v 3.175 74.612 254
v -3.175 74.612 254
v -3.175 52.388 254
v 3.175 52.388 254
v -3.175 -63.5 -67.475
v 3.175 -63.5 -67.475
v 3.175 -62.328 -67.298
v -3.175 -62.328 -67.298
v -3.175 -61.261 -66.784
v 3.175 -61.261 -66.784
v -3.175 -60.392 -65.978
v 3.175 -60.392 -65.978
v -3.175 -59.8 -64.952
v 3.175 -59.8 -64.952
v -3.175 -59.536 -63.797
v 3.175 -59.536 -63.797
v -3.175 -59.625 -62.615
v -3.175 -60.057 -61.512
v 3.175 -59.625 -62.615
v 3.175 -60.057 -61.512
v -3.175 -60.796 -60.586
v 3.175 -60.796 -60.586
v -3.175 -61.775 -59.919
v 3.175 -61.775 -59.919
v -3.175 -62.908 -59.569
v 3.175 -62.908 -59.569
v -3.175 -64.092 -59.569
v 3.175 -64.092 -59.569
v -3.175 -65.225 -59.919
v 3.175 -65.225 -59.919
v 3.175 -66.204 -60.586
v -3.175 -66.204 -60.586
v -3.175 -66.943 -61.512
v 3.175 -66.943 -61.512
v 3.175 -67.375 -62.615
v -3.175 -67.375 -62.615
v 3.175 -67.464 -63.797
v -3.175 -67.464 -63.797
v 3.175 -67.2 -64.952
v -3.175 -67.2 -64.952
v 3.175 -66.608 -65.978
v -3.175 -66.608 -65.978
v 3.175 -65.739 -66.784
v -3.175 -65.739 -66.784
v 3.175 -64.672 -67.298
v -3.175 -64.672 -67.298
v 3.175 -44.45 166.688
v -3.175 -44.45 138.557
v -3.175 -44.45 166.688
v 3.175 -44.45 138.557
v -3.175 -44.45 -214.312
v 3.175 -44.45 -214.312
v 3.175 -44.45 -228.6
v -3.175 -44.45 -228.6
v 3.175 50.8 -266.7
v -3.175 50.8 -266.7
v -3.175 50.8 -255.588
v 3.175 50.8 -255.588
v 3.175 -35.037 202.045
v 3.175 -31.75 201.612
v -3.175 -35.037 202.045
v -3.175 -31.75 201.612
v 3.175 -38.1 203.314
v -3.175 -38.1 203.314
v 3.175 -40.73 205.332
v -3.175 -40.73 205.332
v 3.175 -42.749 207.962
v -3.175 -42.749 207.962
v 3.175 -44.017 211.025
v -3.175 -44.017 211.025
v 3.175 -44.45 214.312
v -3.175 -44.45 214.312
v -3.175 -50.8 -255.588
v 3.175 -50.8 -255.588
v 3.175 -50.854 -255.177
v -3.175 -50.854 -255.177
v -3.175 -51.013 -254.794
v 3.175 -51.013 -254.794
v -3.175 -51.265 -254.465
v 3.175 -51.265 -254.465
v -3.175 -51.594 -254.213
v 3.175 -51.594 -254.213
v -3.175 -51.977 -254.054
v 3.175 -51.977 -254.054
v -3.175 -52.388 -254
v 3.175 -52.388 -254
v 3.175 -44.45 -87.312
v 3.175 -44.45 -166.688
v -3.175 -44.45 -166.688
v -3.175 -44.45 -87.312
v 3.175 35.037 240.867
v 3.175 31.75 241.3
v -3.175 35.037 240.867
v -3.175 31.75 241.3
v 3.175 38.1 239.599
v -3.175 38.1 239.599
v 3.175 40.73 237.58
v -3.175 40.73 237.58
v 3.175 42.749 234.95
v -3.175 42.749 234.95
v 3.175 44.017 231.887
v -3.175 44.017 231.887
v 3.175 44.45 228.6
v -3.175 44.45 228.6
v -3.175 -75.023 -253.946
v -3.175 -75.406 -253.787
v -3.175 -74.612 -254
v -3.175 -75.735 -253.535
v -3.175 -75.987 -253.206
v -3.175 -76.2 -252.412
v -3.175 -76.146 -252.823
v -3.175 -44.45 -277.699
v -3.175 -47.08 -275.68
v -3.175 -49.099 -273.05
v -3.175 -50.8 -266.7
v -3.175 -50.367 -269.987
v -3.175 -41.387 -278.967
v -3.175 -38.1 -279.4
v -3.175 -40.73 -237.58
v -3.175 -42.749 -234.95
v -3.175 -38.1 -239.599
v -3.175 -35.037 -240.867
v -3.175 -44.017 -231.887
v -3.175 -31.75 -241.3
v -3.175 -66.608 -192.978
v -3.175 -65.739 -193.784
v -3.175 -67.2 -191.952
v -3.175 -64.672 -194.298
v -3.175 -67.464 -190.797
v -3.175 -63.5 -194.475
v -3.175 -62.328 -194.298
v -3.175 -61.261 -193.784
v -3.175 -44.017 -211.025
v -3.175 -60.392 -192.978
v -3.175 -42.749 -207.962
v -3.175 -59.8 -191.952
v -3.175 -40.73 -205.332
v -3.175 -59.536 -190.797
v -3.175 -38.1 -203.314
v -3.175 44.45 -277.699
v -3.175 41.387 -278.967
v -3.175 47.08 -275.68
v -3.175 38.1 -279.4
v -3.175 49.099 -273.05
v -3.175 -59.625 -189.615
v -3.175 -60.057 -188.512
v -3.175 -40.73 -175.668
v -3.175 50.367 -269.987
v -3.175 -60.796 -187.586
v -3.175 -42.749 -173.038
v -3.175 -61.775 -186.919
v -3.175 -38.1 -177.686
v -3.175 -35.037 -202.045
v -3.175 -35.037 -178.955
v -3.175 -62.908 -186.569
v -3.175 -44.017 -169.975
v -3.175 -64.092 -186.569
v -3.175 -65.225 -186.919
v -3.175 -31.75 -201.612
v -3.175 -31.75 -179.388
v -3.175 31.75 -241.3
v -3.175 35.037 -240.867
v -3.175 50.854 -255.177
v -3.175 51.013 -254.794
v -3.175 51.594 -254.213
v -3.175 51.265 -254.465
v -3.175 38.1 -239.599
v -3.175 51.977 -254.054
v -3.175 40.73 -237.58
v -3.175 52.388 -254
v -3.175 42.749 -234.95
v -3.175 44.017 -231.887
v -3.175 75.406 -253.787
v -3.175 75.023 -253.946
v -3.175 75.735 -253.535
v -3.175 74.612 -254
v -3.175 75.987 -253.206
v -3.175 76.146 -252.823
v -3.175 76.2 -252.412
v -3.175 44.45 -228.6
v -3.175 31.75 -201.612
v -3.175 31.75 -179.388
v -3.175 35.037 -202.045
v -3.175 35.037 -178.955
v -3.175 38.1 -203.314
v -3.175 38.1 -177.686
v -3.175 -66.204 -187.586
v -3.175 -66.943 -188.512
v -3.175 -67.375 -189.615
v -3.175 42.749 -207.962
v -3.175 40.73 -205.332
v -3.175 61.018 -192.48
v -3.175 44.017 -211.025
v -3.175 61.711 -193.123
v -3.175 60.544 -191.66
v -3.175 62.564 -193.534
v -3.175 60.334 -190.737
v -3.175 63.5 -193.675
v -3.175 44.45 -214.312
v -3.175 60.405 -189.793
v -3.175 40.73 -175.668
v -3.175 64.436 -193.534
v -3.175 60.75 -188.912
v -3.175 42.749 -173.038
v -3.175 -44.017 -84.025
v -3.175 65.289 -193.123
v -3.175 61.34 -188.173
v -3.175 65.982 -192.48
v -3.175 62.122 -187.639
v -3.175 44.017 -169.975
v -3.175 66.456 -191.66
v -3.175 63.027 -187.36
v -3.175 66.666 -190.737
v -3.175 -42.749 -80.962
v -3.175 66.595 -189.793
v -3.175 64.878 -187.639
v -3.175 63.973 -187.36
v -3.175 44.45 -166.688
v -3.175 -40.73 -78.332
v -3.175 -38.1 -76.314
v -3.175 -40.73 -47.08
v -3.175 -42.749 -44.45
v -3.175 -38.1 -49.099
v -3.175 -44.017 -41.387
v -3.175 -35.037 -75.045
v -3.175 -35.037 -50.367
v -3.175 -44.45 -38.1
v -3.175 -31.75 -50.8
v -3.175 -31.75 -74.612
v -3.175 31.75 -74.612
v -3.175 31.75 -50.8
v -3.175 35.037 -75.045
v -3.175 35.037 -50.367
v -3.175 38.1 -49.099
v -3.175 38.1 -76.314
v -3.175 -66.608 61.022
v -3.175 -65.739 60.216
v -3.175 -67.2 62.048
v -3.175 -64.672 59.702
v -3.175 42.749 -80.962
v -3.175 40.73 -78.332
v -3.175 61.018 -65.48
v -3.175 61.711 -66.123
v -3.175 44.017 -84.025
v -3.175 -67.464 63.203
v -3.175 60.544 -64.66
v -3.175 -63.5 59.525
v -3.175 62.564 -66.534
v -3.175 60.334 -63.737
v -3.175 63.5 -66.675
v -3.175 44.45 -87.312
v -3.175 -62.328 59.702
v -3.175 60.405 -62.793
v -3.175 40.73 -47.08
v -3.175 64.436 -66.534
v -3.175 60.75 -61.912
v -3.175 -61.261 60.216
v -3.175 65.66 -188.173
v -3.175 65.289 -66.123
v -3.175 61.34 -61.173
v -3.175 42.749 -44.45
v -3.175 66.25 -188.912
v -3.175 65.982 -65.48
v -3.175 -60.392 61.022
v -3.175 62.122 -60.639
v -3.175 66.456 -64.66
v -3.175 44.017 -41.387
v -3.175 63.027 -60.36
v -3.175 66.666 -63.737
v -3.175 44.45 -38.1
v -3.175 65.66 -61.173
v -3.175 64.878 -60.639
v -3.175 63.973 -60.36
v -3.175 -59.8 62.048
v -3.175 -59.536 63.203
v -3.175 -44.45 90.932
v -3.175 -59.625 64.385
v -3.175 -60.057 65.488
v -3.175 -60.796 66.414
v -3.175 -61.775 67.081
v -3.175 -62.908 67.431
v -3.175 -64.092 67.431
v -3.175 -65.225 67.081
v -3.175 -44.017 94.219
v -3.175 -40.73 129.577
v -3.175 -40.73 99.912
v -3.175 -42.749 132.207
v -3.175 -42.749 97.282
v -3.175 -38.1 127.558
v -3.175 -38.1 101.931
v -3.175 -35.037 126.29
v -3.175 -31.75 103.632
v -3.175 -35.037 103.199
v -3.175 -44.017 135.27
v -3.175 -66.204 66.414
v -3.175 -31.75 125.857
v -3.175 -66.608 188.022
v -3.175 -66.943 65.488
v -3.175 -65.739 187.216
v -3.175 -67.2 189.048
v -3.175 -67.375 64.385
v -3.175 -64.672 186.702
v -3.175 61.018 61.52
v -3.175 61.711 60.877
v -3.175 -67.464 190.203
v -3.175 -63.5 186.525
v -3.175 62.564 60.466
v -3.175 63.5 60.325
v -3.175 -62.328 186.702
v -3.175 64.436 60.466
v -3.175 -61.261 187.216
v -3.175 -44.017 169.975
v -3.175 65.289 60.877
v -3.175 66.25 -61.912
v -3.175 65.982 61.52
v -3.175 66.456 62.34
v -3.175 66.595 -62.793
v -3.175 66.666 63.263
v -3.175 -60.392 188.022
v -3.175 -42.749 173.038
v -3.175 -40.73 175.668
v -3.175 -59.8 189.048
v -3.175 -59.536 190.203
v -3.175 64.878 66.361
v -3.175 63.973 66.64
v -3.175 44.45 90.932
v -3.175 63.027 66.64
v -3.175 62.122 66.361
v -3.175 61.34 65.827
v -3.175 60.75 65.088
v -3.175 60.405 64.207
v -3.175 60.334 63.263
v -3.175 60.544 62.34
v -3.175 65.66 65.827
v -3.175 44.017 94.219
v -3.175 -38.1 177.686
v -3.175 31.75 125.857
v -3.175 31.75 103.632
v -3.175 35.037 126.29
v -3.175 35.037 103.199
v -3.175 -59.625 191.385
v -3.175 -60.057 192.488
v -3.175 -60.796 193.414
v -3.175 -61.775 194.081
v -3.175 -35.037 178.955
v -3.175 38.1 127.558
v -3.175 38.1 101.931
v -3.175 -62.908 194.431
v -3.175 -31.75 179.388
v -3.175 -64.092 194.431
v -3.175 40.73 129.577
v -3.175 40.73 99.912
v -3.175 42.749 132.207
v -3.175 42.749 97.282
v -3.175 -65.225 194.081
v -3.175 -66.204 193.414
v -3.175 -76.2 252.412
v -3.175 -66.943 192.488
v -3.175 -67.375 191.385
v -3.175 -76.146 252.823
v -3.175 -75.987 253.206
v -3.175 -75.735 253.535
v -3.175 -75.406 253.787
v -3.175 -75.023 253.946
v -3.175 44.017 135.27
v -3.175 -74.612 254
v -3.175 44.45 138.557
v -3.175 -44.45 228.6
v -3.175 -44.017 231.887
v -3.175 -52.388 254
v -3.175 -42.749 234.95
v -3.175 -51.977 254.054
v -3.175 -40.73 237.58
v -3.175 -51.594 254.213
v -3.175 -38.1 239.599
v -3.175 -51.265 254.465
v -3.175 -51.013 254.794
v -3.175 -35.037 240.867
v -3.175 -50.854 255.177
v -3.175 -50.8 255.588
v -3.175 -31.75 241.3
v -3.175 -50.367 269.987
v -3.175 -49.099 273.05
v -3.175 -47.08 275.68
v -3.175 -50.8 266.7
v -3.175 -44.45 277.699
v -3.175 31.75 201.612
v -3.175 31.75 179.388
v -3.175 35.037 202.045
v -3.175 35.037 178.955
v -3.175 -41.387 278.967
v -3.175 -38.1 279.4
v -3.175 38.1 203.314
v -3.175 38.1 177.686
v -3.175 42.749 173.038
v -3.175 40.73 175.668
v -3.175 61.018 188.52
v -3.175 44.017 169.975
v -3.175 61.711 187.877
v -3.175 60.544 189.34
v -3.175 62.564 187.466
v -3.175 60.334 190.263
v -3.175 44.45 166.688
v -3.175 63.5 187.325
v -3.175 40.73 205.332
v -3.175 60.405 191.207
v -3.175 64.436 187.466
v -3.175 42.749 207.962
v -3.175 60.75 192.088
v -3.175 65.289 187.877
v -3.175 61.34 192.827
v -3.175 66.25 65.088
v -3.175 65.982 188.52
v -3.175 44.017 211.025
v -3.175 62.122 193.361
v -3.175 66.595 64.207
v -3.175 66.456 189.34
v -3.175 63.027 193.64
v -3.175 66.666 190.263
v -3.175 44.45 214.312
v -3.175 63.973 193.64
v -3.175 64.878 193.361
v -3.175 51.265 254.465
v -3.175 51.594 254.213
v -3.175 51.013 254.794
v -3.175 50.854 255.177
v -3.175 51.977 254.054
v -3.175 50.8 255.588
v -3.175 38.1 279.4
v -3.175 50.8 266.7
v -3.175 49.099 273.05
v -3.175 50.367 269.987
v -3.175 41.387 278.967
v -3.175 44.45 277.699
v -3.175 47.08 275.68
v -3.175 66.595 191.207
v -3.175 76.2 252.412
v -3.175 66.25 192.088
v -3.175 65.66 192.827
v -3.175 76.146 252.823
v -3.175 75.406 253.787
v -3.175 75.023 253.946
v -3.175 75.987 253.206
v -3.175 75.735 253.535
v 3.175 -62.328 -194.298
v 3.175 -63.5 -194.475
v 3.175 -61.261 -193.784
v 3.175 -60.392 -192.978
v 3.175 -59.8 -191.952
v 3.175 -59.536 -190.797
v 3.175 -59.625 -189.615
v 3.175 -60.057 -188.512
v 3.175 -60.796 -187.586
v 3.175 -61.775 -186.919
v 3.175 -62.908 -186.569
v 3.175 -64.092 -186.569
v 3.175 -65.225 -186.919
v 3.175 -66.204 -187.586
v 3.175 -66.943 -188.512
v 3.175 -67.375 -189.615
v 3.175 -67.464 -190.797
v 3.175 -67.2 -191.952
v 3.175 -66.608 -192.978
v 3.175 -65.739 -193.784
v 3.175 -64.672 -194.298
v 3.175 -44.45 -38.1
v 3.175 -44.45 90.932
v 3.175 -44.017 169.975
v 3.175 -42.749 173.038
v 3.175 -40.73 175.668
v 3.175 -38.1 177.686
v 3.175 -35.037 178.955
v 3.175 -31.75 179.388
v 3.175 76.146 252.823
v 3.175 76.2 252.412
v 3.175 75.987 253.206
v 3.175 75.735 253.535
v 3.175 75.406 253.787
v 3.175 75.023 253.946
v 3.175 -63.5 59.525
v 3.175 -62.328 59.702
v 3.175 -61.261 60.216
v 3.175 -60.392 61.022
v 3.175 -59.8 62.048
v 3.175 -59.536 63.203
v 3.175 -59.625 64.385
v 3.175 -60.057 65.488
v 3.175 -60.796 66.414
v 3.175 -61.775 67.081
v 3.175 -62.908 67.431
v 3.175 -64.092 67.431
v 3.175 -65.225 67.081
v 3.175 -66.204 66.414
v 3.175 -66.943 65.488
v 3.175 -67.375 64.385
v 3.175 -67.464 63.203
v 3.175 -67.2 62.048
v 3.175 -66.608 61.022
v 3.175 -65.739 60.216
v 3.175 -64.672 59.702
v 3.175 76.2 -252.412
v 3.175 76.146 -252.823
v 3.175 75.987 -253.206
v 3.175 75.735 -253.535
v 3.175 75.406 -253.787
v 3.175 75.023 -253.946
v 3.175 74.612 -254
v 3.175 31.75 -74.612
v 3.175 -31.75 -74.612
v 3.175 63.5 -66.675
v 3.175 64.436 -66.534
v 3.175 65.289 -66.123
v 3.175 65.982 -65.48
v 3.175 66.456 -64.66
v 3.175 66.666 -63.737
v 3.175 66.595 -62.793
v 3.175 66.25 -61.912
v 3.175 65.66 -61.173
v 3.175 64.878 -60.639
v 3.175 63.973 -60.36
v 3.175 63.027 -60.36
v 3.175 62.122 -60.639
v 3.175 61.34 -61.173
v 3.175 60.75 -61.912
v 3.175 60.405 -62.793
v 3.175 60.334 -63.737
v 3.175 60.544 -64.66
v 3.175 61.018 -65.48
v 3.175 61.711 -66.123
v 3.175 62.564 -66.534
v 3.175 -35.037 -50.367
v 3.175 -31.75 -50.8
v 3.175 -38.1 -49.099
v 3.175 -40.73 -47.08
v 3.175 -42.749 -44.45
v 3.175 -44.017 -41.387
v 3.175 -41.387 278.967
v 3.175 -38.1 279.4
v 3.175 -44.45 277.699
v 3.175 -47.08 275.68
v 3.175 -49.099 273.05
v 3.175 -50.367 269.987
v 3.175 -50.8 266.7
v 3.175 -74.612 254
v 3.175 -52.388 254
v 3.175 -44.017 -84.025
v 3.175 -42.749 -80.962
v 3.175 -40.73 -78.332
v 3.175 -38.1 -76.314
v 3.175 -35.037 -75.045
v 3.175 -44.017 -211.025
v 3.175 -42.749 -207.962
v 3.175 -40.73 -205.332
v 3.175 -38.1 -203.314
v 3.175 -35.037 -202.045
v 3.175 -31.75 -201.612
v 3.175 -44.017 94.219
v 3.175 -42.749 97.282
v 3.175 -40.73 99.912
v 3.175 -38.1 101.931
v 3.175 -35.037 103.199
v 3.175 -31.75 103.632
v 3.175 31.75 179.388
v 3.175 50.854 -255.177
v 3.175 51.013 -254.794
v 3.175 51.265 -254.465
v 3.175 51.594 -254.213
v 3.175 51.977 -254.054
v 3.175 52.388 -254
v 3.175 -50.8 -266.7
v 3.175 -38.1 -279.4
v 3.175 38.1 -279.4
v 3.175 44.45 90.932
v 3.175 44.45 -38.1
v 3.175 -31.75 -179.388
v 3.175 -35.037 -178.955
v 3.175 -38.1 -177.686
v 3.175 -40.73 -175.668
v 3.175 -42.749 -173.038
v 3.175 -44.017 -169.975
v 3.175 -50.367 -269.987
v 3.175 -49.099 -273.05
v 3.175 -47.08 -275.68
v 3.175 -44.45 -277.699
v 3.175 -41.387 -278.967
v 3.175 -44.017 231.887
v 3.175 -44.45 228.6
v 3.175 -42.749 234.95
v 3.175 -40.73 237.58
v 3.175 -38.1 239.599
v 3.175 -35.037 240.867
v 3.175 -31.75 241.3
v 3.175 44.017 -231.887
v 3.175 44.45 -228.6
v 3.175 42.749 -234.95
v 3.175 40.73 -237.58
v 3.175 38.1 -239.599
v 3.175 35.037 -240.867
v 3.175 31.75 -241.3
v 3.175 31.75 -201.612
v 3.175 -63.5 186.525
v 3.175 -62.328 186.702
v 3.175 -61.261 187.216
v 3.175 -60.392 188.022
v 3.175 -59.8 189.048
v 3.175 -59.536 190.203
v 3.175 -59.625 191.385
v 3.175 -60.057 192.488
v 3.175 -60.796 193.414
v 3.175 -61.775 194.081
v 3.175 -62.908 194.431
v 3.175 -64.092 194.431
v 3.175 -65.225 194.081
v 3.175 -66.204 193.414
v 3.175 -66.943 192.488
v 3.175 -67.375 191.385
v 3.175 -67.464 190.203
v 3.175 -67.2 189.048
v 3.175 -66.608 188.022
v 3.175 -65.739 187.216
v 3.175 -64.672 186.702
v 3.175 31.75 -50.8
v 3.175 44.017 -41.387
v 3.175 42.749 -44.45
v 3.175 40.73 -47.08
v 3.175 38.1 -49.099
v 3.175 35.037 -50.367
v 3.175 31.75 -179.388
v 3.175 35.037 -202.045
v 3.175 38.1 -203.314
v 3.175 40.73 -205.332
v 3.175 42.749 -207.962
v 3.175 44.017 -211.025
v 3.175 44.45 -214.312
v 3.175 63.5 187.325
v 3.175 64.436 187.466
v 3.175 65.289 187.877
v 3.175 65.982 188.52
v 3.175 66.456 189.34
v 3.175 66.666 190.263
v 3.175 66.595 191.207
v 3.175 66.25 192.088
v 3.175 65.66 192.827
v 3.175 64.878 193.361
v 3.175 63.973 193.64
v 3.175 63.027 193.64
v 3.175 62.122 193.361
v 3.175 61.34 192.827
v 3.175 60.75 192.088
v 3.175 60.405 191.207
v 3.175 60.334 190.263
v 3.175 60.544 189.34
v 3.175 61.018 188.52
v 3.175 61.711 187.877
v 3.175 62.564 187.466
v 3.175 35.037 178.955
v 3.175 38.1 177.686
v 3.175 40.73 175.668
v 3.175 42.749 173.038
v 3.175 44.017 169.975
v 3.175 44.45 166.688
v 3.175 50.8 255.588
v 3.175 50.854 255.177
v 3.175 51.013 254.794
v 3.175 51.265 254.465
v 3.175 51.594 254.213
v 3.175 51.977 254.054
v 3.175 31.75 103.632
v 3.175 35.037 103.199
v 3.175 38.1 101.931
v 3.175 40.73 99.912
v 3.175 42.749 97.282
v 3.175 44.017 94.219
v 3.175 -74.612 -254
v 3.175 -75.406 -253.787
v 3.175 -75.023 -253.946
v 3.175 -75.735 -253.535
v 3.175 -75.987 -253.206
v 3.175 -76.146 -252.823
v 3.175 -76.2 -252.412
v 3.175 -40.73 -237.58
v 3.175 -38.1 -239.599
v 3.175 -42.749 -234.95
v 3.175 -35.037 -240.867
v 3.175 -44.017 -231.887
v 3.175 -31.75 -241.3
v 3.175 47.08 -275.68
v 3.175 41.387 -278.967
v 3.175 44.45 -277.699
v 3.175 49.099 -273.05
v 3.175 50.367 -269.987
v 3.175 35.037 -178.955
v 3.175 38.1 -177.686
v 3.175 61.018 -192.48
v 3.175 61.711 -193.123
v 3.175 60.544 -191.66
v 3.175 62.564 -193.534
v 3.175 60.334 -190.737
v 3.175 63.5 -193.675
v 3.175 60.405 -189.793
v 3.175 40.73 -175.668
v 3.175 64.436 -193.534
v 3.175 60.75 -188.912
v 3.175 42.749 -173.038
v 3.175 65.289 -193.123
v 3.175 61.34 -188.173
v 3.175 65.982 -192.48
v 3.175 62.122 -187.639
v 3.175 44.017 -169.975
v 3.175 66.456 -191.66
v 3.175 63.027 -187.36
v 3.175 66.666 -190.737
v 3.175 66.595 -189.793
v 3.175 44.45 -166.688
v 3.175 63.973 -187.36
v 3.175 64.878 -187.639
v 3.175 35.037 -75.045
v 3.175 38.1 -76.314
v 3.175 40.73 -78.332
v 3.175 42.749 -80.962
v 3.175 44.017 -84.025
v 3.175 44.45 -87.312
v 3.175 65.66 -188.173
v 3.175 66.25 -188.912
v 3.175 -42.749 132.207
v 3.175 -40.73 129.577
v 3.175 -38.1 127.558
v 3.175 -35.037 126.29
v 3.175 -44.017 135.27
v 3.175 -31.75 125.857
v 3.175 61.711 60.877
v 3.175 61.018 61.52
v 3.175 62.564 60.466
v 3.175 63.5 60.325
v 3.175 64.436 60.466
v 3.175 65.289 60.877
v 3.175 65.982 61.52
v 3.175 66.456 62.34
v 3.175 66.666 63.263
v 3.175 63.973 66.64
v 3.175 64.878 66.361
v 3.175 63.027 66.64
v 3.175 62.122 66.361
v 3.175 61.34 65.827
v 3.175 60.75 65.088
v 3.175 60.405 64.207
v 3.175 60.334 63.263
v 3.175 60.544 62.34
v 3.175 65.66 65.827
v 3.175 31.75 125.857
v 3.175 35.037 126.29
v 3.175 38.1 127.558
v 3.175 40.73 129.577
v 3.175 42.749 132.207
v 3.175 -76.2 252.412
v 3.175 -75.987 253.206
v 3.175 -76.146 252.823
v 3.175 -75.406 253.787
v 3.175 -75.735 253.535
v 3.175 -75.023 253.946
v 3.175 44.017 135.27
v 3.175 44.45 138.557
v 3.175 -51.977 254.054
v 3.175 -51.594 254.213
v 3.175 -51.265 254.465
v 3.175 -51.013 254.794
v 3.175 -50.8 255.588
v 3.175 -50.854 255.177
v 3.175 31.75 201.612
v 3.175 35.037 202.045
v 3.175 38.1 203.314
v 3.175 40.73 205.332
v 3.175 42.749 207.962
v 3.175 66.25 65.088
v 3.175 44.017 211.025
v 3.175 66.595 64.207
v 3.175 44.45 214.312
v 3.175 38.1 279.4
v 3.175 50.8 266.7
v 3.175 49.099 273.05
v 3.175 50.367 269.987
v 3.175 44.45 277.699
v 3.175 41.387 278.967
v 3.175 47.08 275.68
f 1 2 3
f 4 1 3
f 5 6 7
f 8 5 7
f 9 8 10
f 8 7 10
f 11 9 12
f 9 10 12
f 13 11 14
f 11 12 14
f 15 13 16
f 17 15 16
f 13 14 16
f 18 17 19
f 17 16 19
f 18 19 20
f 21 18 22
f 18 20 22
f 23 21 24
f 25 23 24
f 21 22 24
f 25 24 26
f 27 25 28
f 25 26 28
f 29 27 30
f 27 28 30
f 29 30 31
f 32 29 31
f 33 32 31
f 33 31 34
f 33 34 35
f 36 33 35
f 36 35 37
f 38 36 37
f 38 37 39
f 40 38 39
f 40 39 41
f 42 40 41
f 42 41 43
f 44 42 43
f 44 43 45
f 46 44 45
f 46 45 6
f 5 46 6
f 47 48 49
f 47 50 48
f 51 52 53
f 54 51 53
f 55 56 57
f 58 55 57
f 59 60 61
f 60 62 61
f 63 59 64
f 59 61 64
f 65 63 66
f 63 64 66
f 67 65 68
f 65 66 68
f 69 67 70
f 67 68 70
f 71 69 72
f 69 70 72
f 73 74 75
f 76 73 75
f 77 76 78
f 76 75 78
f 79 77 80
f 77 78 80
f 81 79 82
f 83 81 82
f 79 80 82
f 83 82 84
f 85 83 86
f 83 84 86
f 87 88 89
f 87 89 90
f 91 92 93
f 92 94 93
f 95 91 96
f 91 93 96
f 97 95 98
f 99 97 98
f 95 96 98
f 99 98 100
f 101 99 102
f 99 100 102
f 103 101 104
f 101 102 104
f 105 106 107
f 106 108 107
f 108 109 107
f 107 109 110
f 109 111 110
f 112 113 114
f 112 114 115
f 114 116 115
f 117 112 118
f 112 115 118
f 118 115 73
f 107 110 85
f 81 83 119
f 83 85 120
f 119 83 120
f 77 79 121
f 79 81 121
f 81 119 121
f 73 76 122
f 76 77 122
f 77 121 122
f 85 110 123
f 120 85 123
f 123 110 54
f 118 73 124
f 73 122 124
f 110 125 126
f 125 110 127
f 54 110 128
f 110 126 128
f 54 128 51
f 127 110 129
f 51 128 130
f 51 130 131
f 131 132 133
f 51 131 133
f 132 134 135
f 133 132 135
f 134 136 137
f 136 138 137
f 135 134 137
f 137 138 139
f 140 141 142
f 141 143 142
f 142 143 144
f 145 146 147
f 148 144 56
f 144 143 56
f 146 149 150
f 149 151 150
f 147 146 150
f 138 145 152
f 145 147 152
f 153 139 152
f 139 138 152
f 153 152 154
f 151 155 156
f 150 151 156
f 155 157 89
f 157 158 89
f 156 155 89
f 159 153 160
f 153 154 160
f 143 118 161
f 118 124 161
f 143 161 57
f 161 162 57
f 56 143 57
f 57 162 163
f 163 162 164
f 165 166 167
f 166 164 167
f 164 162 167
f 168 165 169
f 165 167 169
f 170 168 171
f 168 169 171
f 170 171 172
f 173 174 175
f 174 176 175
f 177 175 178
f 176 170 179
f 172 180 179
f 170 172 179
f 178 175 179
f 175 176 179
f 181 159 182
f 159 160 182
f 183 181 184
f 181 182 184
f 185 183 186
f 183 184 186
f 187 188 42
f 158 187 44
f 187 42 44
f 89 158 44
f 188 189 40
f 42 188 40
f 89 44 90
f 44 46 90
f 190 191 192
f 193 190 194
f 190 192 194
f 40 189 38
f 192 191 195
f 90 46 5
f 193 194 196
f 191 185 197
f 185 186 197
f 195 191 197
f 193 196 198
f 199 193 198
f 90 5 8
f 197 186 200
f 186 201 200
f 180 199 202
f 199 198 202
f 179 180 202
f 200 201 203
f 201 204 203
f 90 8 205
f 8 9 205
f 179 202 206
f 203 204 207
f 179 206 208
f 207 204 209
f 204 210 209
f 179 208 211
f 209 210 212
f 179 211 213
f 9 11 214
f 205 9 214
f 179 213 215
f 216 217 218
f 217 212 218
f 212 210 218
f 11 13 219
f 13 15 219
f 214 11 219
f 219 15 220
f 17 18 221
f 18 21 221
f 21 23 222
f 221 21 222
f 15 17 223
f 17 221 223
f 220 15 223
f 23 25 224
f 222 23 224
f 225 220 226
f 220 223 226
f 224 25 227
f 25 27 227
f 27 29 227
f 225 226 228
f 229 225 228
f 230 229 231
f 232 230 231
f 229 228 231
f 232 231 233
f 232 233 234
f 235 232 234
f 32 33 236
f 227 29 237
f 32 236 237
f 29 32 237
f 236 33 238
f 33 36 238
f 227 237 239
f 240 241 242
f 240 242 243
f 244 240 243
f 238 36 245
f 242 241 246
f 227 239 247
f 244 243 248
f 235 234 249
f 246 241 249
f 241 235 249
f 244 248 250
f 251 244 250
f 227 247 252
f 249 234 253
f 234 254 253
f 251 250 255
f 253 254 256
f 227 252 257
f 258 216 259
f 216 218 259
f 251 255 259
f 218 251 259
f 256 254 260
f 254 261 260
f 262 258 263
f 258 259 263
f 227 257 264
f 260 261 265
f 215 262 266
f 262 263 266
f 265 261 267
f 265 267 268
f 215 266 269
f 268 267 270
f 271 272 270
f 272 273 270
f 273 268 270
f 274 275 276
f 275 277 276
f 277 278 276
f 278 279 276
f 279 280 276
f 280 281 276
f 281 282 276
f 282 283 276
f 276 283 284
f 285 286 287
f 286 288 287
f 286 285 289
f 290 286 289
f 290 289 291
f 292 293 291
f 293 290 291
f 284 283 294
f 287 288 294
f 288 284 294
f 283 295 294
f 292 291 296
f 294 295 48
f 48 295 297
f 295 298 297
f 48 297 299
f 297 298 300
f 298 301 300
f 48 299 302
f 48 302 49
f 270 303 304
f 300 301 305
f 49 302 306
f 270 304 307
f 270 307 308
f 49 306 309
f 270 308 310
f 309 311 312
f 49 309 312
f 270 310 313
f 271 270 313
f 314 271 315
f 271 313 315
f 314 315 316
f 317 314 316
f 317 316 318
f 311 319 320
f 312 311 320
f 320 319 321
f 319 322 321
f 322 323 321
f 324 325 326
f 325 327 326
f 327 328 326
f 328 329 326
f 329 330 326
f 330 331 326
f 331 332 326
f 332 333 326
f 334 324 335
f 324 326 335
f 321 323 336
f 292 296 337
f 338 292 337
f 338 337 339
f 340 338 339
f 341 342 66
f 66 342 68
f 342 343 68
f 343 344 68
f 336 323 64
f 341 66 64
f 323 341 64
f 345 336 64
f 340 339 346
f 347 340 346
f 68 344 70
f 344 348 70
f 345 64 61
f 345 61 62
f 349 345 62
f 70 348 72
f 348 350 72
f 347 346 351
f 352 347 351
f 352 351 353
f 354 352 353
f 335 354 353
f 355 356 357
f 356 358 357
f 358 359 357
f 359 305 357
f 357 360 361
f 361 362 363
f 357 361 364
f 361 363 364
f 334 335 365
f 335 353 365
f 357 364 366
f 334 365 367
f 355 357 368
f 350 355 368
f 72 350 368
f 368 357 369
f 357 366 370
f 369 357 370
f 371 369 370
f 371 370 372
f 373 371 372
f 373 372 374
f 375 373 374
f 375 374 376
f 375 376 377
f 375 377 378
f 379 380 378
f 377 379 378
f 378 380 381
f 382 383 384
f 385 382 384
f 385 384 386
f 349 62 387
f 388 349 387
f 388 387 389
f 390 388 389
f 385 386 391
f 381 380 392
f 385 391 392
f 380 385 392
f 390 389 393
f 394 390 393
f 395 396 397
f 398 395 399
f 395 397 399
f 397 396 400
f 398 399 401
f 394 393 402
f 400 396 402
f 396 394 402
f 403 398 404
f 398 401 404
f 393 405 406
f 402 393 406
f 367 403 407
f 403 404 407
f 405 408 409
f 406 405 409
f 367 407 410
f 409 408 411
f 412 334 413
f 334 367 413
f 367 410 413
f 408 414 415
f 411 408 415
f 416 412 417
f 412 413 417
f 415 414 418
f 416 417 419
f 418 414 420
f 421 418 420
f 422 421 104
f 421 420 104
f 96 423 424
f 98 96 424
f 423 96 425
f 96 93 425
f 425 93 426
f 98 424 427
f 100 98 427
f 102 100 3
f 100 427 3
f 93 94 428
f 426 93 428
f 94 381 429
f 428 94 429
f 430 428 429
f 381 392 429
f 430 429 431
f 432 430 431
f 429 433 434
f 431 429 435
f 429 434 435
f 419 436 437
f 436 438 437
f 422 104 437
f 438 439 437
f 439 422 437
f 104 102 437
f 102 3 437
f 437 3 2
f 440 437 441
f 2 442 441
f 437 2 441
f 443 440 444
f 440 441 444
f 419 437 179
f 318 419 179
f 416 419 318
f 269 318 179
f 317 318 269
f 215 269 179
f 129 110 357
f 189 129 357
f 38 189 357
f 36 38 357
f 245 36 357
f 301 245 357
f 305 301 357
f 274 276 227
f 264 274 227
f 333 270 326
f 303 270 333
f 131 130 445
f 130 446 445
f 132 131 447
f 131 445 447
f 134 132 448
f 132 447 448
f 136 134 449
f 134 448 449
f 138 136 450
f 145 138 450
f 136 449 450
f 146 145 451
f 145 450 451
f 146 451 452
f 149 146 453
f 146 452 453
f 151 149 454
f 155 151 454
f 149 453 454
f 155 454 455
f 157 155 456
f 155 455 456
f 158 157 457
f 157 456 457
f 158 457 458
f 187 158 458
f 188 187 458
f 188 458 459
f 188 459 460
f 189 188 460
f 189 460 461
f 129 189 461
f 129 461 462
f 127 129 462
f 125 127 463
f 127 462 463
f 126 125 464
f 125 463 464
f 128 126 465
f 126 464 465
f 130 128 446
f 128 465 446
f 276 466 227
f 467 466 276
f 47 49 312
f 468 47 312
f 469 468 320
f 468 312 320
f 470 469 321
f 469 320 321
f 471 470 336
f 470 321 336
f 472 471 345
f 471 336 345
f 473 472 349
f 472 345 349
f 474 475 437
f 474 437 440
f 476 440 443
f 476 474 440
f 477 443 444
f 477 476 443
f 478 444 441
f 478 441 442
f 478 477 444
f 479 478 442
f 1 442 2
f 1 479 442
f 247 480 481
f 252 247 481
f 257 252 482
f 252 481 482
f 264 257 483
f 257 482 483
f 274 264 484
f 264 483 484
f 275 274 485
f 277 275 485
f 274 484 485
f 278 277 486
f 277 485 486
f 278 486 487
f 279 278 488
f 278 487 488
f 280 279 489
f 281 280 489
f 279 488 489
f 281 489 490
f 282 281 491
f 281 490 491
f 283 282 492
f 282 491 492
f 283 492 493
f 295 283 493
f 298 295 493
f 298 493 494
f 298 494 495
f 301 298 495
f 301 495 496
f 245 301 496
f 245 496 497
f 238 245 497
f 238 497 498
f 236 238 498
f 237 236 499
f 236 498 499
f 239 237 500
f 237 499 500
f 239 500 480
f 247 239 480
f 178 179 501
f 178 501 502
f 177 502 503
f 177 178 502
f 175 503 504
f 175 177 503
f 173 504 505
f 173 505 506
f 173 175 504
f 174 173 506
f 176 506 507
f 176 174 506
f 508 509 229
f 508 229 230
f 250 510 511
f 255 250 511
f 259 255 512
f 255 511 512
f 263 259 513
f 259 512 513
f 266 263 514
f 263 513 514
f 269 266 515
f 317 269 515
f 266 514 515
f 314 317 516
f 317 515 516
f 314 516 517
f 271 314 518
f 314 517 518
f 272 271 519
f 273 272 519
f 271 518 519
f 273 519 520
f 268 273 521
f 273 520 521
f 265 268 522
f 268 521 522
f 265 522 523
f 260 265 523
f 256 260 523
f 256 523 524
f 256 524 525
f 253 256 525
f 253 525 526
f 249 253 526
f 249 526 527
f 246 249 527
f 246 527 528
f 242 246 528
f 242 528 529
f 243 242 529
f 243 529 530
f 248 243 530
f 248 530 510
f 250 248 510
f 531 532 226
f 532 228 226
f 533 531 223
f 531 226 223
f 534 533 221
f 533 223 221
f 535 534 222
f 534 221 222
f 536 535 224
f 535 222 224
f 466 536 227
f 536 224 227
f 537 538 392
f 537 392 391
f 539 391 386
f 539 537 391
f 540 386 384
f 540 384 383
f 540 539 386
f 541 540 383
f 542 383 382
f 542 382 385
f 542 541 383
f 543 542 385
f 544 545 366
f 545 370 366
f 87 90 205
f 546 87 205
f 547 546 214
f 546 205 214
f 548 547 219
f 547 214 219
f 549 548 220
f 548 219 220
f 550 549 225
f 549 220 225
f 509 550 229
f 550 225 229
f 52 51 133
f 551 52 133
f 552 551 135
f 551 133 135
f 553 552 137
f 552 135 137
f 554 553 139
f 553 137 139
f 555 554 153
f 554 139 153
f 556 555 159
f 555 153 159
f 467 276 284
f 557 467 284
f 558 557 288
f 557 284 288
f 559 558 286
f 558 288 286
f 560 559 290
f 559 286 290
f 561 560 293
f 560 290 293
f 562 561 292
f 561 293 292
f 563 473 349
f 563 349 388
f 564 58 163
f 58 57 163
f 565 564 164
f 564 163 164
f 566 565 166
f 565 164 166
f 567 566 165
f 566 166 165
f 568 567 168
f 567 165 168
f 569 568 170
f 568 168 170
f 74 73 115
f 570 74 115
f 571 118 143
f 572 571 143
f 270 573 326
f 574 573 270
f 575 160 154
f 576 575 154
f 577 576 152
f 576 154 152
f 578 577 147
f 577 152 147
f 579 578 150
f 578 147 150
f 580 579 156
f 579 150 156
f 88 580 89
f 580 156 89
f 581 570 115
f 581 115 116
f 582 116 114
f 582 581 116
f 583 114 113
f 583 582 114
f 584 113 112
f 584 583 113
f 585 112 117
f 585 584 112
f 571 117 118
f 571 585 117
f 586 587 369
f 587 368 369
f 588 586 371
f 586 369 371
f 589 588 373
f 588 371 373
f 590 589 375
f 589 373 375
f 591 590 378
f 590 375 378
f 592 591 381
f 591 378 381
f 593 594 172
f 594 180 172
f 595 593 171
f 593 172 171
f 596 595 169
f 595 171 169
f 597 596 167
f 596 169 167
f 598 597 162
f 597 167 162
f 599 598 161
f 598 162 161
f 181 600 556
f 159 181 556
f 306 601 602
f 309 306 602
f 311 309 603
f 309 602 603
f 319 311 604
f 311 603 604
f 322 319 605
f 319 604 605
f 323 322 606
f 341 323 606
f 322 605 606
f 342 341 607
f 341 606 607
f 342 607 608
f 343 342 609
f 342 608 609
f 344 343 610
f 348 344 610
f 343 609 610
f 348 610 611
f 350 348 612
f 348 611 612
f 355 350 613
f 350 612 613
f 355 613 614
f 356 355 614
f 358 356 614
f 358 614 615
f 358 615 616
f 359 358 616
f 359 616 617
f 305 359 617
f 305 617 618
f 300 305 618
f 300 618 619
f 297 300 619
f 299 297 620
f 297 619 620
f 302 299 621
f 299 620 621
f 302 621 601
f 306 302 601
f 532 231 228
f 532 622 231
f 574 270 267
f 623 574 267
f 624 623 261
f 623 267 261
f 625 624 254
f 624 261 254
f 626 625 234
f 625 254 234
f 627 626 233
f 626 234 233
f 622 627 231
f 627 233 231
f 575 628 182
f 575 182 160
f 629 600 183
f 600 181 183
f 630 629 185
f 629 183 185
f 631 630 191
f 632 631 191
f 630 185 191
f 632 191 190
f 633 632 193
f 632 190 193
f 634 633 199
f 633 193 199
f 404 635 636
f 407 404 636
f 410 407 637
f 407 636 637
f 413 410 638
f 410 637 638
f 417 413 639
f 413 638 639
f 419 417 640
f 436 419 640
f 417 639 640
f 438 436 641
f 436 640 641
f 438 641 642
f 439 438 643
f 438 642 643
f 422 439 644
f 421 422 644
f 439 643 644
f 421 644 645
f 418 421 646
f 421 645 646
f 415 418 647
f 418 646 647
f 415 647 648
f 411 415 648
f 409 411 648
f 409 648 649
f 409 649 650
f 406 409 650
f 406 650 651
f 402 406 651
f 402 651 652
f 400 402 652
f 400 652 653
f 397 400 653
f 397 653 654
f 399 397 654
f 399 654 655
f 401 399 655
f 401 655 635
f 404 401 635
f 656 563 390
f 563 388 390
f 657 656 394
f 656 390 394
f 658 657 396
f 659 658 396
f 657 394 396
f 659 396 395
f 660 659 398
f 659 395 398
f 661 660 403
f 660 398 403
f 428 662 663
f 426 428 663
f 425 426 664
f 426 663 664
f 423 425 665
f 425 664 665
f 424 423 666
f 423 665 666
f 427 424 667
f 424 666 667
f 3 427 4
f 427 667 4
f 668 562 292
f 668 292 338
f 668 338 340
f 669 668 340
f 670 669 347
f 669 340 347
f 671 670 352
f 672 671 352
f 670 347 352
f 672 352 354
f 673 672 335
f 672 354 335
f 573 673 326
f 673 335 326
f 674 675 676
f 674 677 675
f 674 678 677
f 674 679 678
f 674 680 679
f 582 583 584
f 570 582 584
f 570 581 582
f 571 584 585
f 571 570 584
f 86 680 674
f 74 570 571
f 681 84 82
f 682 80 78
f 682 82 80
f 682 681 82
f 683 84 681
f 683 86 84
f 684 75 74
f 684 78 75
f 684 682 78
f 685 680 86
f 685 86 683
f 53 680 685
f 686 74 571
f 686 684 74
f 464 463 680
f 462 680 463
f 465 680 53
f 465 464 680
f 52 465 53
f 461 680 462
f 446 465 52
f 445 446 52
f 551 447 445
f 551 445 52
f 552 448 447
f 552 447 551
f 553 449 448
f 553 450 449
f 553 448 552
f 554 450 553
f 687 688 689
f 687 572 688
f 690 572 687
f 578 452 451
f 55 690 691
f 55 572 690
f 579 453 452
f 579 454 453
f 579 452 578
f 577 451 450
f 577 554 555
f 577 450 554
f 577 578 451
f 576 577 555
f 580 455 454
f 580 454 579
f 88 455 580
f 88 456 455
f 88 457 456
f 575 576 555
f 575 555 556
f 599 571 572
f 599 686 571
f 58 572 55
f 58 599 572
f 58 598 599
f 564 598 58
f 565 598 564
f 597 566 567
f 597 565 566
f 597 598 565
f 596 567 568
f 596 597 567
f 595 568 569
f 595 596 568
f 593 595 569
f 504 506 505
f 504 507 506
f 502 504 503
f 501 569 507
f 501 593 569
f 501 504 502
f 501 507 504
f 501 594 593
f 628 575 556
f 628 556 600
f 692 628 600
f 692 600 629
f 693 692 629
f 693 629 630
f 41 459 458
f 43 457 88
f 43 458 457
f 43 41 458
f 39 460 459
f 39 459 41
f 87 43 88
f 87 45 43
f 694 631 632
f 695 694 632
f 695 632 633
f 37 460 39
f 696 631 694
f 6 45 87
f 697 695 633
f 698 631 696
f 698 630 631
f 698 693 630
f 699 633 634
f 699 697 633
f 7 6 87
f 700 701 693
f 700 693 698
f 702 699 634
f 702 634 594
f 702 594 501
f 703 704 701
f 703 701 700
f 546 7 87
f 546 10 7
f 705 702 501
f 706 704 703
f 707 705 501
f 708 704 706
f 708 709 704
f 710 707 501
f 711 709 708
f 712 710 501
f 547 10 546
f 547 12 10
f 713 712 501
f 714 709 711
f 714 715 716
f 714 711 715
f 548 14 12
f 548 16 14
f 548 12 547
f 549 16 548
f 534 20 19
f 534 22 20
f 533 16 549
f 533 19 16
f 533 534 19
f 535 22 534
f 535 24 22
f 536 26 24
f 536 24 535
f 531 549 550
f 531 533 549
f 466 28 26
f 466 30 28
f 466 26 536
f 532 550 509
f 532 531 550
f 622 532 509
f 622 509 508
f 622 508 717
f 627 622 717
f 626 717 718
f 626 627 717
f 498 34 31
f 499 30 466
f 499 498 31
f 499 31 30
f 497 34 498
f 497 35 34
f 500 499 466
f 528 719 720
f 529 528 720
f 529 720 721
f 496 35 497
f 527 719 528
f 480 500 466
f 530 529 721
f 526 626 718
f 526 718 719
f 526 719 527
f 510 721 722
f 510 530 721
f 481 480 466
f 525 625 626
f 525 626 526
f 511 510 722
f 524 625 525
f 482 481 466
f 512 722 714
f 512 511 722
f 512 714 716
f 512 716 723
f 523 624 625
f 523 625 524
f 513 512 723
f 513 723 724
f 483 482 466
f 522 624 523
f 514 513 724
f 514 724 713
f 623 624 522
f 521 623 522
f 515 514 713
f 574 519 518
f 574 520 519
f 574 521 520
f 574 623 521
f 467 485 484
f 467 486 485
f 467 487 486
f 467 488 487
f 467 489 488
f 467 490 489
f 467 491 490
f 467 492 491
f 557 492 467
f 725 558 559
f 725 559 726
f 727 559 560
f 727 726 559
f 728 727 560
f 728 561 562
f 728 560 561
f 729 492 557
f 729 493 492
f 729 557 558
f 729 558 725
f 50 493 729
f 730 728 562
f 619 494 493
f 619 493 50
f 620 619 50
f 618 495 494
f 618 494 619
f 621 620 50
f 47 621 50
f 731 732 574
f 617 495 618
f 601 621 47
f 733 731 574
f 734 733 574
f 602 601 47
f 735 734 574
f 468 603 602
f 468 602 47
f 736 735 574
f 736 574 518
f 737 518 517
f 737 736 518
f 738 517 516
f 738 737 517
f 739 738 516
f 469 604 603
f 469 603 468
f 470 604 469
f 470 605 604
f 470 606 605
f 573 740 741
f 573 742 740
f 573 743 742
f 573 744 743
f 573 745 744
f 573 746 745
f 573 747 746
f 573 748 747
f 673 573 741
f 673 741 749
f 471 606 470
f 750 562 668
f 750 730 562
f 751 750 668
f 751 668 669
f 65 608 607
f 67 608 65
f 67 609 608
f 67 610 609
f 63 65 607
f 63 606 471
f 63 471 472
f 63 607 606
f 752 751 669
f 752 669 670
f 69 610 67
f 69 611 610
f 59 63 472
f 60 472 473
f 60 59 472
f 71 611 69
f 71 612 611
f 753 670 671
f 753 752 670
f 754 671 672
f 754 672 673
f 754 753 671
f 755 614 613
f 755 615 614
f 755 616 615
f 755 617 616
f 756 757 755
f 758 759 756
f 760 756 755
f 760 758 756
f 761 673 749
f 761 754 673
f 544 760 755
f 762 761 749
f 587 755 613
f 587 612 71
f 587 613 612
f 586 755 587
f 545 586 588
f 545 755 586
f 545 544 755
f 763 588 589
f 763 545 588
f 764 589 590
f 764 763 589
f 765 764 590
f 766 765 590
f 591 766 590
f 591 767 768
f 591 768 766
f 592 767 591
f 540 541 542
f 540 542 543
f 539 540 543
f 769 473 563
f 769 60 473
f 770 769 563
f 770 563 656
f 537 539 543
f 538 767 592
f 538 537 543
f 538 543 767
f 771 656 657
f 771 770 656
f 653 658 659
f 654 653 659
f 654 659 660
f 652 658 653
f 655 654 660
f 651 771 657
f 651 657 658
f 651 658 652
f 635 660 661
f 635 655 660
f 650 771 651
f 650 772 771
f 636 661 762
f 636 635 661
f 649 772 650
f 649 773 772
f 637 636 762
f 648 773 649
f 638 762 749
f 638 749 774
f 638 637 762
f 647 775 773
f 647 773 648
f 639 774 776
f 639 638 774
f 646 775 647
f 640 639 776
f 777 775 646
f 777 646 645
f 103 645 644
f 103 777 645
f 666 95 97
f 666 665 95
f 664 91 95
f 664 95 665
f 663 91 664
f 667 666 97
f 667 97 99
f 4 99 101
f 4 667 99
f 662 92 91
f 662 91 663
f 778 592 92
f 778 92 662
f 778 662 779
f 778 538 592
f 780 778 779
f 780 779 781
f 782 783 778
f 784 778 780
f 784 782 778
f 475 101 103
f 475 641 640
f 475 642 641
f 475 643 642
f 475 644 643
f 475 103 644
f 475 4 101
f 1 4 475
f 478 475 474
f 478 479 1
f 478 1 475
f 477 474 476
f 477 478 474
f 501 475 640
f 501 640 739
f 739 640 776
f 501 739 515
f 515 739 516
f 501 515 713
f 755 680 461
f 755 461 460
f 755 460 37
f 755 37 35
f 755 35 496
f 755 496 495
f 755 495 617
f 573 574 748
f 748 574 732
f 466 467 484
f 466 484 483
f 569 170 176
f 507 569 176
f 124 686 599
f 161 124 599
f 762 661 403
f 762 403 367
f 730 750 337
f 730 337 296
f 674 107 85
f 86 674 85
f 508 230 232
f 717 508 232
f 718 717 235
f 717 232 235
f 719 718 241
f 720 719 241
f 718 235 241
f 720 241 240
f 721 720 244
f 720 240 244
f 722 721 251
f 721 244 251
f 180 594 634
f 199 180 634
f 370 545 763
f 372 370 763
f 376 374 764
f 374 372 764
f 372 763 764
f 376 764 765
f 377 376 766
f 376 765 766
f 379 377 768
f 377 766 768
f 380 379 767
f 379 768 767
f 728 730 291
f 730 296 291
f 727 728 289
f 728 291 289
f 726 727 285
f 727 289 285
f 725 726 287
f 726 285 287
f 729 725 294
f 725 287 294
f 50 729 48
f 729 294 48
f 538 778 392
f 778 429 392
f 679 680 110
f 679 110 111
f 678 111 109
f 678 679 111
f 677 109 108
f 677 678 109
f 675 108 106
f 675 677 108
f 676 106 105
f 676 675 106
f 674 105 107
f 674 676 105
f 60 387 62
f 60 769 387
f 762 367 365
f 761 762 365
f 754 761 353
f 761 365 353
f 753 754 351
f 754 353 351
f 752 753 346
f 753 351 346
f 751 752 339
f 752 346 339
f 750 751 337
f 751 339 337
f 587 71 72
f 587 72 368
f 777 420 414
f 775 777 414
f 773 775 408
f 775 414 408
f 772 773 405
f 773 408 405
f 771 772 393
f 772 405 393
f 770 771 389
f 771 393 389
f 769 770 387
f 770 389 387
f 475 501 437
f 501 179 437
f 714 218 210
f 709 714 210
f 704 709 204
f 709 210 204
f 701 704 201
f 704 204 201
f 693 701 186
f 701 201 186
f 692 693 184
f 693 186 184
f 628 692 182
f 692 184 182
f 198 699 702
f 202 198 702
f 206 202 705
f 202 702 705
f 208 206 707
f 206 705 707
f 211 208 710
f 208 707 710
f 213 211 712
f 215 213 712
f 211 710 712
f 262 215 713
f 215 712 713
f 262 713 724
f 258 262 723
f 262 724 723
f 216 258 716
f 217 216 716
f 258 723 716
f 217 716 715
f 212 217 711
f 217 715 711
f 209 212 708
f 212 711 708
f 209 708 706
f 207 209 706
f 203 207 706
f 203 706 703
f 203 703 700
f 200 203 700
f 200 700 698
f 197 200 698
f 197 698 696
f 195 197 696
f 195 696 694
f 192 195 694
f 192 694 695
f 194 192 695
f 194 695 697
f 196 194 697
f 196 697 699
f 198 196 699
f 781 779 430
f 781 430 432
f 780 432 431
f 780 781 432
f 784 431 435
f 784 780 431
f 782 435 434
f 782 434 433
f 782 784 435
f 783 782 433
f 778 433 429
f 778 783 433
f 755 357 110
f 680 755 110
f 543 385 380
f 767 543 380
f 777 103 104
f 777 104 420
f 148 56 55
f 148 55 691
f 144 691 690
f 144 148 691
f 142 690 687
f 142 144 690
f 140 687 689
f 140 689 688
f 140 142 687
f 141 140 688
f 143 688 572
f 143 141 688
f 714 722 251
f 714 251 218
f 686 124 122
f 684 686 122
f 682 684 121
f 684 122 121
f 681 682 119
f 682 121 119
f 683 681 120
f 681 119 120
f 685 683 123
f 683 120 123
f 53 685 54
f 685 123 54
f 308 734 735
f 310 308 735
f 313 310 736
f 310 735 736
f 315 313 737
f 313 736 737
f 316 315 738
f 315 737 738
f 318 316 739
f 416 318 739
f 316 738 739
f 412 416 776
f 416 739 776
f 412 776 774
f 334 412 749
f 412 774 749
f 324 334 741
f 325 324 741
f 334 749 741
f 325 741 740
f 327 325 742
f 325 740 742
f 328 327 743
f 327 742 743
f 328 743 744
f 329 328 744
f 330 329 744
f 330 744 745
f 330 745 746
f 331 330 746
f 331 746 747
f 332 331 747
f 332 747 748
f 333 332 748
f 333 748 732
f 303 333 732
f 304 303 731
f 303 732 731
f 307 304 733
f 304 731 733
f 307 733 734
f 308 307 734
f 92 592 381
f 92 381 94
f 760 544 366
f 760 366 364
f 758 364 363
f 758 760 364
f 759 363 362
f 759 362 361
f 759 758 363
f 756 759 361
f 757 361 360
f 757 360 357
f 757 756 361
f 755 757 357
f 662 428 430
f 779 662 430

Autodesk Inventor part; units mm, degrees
ref_plane "YZ Plane" through (0, 0, 0) normal (1, 0, 0) x (0, 1, 0)
ref_plane "XZ Plane" through (0, 0, 0) normal (0, 1, 0) x (-1, 0, 0)
ref_plane "XY Plane" through (0, 0, 0) normal (0, 0, 1) x (1, 0, 0)
sketch "Sketch1" plane through (0, 0, 0) normal (1, 0, 0) x (0, 1, 0)
  line L0 (76.2, 254) -> (-76.2, 254)
  line L1 (-76.2, 254) -> (-76.2, -254)
  line L2 (-76.2, -254) -> (76.2, -254)
  line L3 (76.2, -254) -> (76.2, 254)
  line L4 (76.2, 254) -> (-76.2, -254) construction
  line L5 (-76.2, 254) -> (76.2, -254) construction
  line L6 (50.8, 279.4) -> (-50.8, 279.4)
  line L7 (-50.8, 279.4) -> (-50.8, 254)
  line L8 (-50.8, 254) -> (50.8, 254)
  line L9 (50.8, 254) -> (50.8, 279.4)
  line L10 (50.8, 279.4) -> (-50.8, 254) construction
  line L11 (-50.8, 279.4) -> (50.8, 254) construction
  line L12 (50.8, -254) -> (-50.8, -254)
  line L13 (-50.8, -254) -> (-50.8, -279.4)
  line L14 (-50.8, -279.4) -> (50.8, -279.4)
  line L15 (50.8, -279.4) -> (50.8, -254)
  line L16 (50.8, -254) -> (-50.8, -279.4) construction
  line L17 (-50.8, -254) -> (50.8, -279.4) construction
  line L18 (0, 266.7) -> (0, -266.7) construction
  point P0 (0, 0)
  point P1 (-50.8, -254)
  point P2 (50.8, 254)
  dimension "d0" = 152.4
  dimension "d1" = 508
  dimension "d9" = 25.4
  dimension "d10" = 101.6
extrude "Extrusion1" add sketch "Sketch1" along normal mid plane 6.35
sketch "Sketch3" plane through (3.175, 0, 0) normal (1, 0, 0) x (0, 0, -1)
  line L0 (-241.3, 44.45) -> (-201.6125, 44.45)
  line L1 (-201.6125, 44.45) -> (-201.6125, -44.45)
  line L2 (-201.6125, -44.45) -> (-241.3, -44.45)
  line L3 (-241.3, -44.45) -> (-241.3, 44.45)
  line L4 (-179.3875, 44.45) -> (-125.857, 44.45)
  line L5 (-125.857, 44.45) -> (-125.857, -44.45)
  line L6 (-125.857, -44.45) -> (-179.3875, -44.45)
  line L7 (-179.3875, -44.45) -> (-179.3875, 44.45)
  line L8 (-103.632, 44.45) -> (50.8, 44.45)
  line L9 (50.8, 44.45) -> (50.8, -44.45)
  line L10 (50.8, -44.45) -> (-103.632, -44.45)
  line L11 (-103.632, -44.45) -> (-103.632, 44.45)
  line L12 (74.6125, 44.45) -> (179.3875, 44.45)
  line L13 (179.3875, 44.45) -> (179.3875, -44.45)
  line L14 (179.3875, -44.45) -> (74.6125, -44.45)
  line L15 (74.6125, -44.45) -> (74.6125, 44.45)
  line L16 (201.6125, -44.45) -> (241.3, -44.45)
  line L17 (241.3, -44.45) -> (241.3, 44.45)
  line L18 (241.3, 44.45) -> (201.6125, 44.45)
  line L19 (201.6125, 44.45) -> (201.6125, -44.45)
  line L20 (-201.6125, 0) -> (-179.3875, 0) construction
  line L21 (-125.857, 0) -> (-103.632, 0) construction
  line L22 (179.3875, 0) -> (201.6125, 0) construction
  line L23 (-254, -50.8) -> (-254, -76.2) construction
  circle A0 centre (-190.5, 63.5) radius 3.175
  line L24 (-190.5, 63.5) -> (-190.5, 0) construction
  line L25 (-190.5, 0) -> (-190.5, -63.5) construction
  circle A1 centre (-190.5, -63.5) radius 3.9751
  circle A2 centre (-63.5, 63.5) radius 3.175
  circle A3 centre (-63.5, -63.5) radius 3.9751
  circle A4 centre (63.5, 63.5) radius 3.175
  circle A5 centre (63.5, -63.5) radius 3.9751
  circle A6 centre (190.5, 63.5) radius 3.175
  circle A7 centre (190.5, -63.5) radius 3.9751
  line L26 (-125.857, 44.45) -> (-103.632, 44.45)
  line L27 (-103.632, 44.45) -> (-103.632, -44.45)
  line L28 (-103.632, -44.45) -> (-125.857, -44.45)
  line L29 (-125.857, -44.45) -> (-125.857, 44.45)
  line L30 (254, -76.2) -> (254, -50.8) projected
  line L31 (-254, -76.2) -> (254, -76.2) projected
  point P0 (0, 0)
  point P1 (0, 0)
  point P2 (-114.7445, 0)
  dimension "d12" = 22.225
  dimension "d13" = 12.7
  dimension "d14" = 88.9
  dimension "d16" = 6.35
  dimension "d17" = 7.9502
  dimension "d20" = 127
  dimension "d29" = 12.7
  dimension "d30" = 63.5
  dimension "d31" = 12.7
  dimension "d32" = 11.1125
  dimension "d33" = 31.75
  dimension "d34" = 127
  dimension "d35" = 63.5
  dimension "d39" = 154.432
extrude "Extrusion3" cut sketch "Sketch3" against normal through all contours L0 L1 L2 L3 | L4 L5 L6 L7 | L8 L9 L10 L11 | L12 L13 L14 L15 | L19 L18 L17 L16 | A0 | A1 | A2 | A3 | A4 | A5 | A6 | A7
fillet "Fillet1" radius 12.7 24 edges at (0, 50.8, 279.4) (0, 44.45, 241.3) (0, 44.45, 201.6125) (0, -44.45, 201.6125) (0, -44.45, 241.3) (0, -50.8, 279.4) (0, -44.45, 179.3875) (0, 44.45, 179.3875) (0, -44.45, -50.8) (0, -44.45, -74.6125) (0, 44.45, -74.6125) (0, 44.45, -50.8) (0, 44.45, -179.3875) (0, 44.45, -201.6125) (0, 44.45, -241.3) (0, 50.8, -279.4) (0, -50.8, -279.4) (0, -44.45, -241.3) (0, -44.45, -201.6125) (0, -44.45, -179.3875) (0, 44.45, 125.857) (0, 44.45, 103.632) (0, -44.45, 103.632) (0, -44.45, 125.857)
fillet "Fillet1" radius 1.5875 8 edges at (0, 50.8, 254) (0, -50.8, 254) (0, -76.2, 254) (0, 76.2, 254) (0, 76.2, -254) (0, 50.8, -254) (0, -50.8, -254) (0, -76.2, -254)
sketch "Sketch4" plane through (-3.175, 0, 0) normal (-1, 0, 0) x (0, 0, 1)
  line L0 (-182.626, 63.5635) -> (-141.351, 63.5635) construction
  line L1 (-254, 74.6125) -> (-254, 52.3875) construction
  line L2 (252.4125, 76.2) -> (-252.4125, 76.2) construction
  point P0 (0, 0)
  dimension "d36" = 71.374
  dimension "d37" = 12.6365
  dimension "d38" = 41.275
properties part number "ChassisInterface" material "Aluminum 6061"
